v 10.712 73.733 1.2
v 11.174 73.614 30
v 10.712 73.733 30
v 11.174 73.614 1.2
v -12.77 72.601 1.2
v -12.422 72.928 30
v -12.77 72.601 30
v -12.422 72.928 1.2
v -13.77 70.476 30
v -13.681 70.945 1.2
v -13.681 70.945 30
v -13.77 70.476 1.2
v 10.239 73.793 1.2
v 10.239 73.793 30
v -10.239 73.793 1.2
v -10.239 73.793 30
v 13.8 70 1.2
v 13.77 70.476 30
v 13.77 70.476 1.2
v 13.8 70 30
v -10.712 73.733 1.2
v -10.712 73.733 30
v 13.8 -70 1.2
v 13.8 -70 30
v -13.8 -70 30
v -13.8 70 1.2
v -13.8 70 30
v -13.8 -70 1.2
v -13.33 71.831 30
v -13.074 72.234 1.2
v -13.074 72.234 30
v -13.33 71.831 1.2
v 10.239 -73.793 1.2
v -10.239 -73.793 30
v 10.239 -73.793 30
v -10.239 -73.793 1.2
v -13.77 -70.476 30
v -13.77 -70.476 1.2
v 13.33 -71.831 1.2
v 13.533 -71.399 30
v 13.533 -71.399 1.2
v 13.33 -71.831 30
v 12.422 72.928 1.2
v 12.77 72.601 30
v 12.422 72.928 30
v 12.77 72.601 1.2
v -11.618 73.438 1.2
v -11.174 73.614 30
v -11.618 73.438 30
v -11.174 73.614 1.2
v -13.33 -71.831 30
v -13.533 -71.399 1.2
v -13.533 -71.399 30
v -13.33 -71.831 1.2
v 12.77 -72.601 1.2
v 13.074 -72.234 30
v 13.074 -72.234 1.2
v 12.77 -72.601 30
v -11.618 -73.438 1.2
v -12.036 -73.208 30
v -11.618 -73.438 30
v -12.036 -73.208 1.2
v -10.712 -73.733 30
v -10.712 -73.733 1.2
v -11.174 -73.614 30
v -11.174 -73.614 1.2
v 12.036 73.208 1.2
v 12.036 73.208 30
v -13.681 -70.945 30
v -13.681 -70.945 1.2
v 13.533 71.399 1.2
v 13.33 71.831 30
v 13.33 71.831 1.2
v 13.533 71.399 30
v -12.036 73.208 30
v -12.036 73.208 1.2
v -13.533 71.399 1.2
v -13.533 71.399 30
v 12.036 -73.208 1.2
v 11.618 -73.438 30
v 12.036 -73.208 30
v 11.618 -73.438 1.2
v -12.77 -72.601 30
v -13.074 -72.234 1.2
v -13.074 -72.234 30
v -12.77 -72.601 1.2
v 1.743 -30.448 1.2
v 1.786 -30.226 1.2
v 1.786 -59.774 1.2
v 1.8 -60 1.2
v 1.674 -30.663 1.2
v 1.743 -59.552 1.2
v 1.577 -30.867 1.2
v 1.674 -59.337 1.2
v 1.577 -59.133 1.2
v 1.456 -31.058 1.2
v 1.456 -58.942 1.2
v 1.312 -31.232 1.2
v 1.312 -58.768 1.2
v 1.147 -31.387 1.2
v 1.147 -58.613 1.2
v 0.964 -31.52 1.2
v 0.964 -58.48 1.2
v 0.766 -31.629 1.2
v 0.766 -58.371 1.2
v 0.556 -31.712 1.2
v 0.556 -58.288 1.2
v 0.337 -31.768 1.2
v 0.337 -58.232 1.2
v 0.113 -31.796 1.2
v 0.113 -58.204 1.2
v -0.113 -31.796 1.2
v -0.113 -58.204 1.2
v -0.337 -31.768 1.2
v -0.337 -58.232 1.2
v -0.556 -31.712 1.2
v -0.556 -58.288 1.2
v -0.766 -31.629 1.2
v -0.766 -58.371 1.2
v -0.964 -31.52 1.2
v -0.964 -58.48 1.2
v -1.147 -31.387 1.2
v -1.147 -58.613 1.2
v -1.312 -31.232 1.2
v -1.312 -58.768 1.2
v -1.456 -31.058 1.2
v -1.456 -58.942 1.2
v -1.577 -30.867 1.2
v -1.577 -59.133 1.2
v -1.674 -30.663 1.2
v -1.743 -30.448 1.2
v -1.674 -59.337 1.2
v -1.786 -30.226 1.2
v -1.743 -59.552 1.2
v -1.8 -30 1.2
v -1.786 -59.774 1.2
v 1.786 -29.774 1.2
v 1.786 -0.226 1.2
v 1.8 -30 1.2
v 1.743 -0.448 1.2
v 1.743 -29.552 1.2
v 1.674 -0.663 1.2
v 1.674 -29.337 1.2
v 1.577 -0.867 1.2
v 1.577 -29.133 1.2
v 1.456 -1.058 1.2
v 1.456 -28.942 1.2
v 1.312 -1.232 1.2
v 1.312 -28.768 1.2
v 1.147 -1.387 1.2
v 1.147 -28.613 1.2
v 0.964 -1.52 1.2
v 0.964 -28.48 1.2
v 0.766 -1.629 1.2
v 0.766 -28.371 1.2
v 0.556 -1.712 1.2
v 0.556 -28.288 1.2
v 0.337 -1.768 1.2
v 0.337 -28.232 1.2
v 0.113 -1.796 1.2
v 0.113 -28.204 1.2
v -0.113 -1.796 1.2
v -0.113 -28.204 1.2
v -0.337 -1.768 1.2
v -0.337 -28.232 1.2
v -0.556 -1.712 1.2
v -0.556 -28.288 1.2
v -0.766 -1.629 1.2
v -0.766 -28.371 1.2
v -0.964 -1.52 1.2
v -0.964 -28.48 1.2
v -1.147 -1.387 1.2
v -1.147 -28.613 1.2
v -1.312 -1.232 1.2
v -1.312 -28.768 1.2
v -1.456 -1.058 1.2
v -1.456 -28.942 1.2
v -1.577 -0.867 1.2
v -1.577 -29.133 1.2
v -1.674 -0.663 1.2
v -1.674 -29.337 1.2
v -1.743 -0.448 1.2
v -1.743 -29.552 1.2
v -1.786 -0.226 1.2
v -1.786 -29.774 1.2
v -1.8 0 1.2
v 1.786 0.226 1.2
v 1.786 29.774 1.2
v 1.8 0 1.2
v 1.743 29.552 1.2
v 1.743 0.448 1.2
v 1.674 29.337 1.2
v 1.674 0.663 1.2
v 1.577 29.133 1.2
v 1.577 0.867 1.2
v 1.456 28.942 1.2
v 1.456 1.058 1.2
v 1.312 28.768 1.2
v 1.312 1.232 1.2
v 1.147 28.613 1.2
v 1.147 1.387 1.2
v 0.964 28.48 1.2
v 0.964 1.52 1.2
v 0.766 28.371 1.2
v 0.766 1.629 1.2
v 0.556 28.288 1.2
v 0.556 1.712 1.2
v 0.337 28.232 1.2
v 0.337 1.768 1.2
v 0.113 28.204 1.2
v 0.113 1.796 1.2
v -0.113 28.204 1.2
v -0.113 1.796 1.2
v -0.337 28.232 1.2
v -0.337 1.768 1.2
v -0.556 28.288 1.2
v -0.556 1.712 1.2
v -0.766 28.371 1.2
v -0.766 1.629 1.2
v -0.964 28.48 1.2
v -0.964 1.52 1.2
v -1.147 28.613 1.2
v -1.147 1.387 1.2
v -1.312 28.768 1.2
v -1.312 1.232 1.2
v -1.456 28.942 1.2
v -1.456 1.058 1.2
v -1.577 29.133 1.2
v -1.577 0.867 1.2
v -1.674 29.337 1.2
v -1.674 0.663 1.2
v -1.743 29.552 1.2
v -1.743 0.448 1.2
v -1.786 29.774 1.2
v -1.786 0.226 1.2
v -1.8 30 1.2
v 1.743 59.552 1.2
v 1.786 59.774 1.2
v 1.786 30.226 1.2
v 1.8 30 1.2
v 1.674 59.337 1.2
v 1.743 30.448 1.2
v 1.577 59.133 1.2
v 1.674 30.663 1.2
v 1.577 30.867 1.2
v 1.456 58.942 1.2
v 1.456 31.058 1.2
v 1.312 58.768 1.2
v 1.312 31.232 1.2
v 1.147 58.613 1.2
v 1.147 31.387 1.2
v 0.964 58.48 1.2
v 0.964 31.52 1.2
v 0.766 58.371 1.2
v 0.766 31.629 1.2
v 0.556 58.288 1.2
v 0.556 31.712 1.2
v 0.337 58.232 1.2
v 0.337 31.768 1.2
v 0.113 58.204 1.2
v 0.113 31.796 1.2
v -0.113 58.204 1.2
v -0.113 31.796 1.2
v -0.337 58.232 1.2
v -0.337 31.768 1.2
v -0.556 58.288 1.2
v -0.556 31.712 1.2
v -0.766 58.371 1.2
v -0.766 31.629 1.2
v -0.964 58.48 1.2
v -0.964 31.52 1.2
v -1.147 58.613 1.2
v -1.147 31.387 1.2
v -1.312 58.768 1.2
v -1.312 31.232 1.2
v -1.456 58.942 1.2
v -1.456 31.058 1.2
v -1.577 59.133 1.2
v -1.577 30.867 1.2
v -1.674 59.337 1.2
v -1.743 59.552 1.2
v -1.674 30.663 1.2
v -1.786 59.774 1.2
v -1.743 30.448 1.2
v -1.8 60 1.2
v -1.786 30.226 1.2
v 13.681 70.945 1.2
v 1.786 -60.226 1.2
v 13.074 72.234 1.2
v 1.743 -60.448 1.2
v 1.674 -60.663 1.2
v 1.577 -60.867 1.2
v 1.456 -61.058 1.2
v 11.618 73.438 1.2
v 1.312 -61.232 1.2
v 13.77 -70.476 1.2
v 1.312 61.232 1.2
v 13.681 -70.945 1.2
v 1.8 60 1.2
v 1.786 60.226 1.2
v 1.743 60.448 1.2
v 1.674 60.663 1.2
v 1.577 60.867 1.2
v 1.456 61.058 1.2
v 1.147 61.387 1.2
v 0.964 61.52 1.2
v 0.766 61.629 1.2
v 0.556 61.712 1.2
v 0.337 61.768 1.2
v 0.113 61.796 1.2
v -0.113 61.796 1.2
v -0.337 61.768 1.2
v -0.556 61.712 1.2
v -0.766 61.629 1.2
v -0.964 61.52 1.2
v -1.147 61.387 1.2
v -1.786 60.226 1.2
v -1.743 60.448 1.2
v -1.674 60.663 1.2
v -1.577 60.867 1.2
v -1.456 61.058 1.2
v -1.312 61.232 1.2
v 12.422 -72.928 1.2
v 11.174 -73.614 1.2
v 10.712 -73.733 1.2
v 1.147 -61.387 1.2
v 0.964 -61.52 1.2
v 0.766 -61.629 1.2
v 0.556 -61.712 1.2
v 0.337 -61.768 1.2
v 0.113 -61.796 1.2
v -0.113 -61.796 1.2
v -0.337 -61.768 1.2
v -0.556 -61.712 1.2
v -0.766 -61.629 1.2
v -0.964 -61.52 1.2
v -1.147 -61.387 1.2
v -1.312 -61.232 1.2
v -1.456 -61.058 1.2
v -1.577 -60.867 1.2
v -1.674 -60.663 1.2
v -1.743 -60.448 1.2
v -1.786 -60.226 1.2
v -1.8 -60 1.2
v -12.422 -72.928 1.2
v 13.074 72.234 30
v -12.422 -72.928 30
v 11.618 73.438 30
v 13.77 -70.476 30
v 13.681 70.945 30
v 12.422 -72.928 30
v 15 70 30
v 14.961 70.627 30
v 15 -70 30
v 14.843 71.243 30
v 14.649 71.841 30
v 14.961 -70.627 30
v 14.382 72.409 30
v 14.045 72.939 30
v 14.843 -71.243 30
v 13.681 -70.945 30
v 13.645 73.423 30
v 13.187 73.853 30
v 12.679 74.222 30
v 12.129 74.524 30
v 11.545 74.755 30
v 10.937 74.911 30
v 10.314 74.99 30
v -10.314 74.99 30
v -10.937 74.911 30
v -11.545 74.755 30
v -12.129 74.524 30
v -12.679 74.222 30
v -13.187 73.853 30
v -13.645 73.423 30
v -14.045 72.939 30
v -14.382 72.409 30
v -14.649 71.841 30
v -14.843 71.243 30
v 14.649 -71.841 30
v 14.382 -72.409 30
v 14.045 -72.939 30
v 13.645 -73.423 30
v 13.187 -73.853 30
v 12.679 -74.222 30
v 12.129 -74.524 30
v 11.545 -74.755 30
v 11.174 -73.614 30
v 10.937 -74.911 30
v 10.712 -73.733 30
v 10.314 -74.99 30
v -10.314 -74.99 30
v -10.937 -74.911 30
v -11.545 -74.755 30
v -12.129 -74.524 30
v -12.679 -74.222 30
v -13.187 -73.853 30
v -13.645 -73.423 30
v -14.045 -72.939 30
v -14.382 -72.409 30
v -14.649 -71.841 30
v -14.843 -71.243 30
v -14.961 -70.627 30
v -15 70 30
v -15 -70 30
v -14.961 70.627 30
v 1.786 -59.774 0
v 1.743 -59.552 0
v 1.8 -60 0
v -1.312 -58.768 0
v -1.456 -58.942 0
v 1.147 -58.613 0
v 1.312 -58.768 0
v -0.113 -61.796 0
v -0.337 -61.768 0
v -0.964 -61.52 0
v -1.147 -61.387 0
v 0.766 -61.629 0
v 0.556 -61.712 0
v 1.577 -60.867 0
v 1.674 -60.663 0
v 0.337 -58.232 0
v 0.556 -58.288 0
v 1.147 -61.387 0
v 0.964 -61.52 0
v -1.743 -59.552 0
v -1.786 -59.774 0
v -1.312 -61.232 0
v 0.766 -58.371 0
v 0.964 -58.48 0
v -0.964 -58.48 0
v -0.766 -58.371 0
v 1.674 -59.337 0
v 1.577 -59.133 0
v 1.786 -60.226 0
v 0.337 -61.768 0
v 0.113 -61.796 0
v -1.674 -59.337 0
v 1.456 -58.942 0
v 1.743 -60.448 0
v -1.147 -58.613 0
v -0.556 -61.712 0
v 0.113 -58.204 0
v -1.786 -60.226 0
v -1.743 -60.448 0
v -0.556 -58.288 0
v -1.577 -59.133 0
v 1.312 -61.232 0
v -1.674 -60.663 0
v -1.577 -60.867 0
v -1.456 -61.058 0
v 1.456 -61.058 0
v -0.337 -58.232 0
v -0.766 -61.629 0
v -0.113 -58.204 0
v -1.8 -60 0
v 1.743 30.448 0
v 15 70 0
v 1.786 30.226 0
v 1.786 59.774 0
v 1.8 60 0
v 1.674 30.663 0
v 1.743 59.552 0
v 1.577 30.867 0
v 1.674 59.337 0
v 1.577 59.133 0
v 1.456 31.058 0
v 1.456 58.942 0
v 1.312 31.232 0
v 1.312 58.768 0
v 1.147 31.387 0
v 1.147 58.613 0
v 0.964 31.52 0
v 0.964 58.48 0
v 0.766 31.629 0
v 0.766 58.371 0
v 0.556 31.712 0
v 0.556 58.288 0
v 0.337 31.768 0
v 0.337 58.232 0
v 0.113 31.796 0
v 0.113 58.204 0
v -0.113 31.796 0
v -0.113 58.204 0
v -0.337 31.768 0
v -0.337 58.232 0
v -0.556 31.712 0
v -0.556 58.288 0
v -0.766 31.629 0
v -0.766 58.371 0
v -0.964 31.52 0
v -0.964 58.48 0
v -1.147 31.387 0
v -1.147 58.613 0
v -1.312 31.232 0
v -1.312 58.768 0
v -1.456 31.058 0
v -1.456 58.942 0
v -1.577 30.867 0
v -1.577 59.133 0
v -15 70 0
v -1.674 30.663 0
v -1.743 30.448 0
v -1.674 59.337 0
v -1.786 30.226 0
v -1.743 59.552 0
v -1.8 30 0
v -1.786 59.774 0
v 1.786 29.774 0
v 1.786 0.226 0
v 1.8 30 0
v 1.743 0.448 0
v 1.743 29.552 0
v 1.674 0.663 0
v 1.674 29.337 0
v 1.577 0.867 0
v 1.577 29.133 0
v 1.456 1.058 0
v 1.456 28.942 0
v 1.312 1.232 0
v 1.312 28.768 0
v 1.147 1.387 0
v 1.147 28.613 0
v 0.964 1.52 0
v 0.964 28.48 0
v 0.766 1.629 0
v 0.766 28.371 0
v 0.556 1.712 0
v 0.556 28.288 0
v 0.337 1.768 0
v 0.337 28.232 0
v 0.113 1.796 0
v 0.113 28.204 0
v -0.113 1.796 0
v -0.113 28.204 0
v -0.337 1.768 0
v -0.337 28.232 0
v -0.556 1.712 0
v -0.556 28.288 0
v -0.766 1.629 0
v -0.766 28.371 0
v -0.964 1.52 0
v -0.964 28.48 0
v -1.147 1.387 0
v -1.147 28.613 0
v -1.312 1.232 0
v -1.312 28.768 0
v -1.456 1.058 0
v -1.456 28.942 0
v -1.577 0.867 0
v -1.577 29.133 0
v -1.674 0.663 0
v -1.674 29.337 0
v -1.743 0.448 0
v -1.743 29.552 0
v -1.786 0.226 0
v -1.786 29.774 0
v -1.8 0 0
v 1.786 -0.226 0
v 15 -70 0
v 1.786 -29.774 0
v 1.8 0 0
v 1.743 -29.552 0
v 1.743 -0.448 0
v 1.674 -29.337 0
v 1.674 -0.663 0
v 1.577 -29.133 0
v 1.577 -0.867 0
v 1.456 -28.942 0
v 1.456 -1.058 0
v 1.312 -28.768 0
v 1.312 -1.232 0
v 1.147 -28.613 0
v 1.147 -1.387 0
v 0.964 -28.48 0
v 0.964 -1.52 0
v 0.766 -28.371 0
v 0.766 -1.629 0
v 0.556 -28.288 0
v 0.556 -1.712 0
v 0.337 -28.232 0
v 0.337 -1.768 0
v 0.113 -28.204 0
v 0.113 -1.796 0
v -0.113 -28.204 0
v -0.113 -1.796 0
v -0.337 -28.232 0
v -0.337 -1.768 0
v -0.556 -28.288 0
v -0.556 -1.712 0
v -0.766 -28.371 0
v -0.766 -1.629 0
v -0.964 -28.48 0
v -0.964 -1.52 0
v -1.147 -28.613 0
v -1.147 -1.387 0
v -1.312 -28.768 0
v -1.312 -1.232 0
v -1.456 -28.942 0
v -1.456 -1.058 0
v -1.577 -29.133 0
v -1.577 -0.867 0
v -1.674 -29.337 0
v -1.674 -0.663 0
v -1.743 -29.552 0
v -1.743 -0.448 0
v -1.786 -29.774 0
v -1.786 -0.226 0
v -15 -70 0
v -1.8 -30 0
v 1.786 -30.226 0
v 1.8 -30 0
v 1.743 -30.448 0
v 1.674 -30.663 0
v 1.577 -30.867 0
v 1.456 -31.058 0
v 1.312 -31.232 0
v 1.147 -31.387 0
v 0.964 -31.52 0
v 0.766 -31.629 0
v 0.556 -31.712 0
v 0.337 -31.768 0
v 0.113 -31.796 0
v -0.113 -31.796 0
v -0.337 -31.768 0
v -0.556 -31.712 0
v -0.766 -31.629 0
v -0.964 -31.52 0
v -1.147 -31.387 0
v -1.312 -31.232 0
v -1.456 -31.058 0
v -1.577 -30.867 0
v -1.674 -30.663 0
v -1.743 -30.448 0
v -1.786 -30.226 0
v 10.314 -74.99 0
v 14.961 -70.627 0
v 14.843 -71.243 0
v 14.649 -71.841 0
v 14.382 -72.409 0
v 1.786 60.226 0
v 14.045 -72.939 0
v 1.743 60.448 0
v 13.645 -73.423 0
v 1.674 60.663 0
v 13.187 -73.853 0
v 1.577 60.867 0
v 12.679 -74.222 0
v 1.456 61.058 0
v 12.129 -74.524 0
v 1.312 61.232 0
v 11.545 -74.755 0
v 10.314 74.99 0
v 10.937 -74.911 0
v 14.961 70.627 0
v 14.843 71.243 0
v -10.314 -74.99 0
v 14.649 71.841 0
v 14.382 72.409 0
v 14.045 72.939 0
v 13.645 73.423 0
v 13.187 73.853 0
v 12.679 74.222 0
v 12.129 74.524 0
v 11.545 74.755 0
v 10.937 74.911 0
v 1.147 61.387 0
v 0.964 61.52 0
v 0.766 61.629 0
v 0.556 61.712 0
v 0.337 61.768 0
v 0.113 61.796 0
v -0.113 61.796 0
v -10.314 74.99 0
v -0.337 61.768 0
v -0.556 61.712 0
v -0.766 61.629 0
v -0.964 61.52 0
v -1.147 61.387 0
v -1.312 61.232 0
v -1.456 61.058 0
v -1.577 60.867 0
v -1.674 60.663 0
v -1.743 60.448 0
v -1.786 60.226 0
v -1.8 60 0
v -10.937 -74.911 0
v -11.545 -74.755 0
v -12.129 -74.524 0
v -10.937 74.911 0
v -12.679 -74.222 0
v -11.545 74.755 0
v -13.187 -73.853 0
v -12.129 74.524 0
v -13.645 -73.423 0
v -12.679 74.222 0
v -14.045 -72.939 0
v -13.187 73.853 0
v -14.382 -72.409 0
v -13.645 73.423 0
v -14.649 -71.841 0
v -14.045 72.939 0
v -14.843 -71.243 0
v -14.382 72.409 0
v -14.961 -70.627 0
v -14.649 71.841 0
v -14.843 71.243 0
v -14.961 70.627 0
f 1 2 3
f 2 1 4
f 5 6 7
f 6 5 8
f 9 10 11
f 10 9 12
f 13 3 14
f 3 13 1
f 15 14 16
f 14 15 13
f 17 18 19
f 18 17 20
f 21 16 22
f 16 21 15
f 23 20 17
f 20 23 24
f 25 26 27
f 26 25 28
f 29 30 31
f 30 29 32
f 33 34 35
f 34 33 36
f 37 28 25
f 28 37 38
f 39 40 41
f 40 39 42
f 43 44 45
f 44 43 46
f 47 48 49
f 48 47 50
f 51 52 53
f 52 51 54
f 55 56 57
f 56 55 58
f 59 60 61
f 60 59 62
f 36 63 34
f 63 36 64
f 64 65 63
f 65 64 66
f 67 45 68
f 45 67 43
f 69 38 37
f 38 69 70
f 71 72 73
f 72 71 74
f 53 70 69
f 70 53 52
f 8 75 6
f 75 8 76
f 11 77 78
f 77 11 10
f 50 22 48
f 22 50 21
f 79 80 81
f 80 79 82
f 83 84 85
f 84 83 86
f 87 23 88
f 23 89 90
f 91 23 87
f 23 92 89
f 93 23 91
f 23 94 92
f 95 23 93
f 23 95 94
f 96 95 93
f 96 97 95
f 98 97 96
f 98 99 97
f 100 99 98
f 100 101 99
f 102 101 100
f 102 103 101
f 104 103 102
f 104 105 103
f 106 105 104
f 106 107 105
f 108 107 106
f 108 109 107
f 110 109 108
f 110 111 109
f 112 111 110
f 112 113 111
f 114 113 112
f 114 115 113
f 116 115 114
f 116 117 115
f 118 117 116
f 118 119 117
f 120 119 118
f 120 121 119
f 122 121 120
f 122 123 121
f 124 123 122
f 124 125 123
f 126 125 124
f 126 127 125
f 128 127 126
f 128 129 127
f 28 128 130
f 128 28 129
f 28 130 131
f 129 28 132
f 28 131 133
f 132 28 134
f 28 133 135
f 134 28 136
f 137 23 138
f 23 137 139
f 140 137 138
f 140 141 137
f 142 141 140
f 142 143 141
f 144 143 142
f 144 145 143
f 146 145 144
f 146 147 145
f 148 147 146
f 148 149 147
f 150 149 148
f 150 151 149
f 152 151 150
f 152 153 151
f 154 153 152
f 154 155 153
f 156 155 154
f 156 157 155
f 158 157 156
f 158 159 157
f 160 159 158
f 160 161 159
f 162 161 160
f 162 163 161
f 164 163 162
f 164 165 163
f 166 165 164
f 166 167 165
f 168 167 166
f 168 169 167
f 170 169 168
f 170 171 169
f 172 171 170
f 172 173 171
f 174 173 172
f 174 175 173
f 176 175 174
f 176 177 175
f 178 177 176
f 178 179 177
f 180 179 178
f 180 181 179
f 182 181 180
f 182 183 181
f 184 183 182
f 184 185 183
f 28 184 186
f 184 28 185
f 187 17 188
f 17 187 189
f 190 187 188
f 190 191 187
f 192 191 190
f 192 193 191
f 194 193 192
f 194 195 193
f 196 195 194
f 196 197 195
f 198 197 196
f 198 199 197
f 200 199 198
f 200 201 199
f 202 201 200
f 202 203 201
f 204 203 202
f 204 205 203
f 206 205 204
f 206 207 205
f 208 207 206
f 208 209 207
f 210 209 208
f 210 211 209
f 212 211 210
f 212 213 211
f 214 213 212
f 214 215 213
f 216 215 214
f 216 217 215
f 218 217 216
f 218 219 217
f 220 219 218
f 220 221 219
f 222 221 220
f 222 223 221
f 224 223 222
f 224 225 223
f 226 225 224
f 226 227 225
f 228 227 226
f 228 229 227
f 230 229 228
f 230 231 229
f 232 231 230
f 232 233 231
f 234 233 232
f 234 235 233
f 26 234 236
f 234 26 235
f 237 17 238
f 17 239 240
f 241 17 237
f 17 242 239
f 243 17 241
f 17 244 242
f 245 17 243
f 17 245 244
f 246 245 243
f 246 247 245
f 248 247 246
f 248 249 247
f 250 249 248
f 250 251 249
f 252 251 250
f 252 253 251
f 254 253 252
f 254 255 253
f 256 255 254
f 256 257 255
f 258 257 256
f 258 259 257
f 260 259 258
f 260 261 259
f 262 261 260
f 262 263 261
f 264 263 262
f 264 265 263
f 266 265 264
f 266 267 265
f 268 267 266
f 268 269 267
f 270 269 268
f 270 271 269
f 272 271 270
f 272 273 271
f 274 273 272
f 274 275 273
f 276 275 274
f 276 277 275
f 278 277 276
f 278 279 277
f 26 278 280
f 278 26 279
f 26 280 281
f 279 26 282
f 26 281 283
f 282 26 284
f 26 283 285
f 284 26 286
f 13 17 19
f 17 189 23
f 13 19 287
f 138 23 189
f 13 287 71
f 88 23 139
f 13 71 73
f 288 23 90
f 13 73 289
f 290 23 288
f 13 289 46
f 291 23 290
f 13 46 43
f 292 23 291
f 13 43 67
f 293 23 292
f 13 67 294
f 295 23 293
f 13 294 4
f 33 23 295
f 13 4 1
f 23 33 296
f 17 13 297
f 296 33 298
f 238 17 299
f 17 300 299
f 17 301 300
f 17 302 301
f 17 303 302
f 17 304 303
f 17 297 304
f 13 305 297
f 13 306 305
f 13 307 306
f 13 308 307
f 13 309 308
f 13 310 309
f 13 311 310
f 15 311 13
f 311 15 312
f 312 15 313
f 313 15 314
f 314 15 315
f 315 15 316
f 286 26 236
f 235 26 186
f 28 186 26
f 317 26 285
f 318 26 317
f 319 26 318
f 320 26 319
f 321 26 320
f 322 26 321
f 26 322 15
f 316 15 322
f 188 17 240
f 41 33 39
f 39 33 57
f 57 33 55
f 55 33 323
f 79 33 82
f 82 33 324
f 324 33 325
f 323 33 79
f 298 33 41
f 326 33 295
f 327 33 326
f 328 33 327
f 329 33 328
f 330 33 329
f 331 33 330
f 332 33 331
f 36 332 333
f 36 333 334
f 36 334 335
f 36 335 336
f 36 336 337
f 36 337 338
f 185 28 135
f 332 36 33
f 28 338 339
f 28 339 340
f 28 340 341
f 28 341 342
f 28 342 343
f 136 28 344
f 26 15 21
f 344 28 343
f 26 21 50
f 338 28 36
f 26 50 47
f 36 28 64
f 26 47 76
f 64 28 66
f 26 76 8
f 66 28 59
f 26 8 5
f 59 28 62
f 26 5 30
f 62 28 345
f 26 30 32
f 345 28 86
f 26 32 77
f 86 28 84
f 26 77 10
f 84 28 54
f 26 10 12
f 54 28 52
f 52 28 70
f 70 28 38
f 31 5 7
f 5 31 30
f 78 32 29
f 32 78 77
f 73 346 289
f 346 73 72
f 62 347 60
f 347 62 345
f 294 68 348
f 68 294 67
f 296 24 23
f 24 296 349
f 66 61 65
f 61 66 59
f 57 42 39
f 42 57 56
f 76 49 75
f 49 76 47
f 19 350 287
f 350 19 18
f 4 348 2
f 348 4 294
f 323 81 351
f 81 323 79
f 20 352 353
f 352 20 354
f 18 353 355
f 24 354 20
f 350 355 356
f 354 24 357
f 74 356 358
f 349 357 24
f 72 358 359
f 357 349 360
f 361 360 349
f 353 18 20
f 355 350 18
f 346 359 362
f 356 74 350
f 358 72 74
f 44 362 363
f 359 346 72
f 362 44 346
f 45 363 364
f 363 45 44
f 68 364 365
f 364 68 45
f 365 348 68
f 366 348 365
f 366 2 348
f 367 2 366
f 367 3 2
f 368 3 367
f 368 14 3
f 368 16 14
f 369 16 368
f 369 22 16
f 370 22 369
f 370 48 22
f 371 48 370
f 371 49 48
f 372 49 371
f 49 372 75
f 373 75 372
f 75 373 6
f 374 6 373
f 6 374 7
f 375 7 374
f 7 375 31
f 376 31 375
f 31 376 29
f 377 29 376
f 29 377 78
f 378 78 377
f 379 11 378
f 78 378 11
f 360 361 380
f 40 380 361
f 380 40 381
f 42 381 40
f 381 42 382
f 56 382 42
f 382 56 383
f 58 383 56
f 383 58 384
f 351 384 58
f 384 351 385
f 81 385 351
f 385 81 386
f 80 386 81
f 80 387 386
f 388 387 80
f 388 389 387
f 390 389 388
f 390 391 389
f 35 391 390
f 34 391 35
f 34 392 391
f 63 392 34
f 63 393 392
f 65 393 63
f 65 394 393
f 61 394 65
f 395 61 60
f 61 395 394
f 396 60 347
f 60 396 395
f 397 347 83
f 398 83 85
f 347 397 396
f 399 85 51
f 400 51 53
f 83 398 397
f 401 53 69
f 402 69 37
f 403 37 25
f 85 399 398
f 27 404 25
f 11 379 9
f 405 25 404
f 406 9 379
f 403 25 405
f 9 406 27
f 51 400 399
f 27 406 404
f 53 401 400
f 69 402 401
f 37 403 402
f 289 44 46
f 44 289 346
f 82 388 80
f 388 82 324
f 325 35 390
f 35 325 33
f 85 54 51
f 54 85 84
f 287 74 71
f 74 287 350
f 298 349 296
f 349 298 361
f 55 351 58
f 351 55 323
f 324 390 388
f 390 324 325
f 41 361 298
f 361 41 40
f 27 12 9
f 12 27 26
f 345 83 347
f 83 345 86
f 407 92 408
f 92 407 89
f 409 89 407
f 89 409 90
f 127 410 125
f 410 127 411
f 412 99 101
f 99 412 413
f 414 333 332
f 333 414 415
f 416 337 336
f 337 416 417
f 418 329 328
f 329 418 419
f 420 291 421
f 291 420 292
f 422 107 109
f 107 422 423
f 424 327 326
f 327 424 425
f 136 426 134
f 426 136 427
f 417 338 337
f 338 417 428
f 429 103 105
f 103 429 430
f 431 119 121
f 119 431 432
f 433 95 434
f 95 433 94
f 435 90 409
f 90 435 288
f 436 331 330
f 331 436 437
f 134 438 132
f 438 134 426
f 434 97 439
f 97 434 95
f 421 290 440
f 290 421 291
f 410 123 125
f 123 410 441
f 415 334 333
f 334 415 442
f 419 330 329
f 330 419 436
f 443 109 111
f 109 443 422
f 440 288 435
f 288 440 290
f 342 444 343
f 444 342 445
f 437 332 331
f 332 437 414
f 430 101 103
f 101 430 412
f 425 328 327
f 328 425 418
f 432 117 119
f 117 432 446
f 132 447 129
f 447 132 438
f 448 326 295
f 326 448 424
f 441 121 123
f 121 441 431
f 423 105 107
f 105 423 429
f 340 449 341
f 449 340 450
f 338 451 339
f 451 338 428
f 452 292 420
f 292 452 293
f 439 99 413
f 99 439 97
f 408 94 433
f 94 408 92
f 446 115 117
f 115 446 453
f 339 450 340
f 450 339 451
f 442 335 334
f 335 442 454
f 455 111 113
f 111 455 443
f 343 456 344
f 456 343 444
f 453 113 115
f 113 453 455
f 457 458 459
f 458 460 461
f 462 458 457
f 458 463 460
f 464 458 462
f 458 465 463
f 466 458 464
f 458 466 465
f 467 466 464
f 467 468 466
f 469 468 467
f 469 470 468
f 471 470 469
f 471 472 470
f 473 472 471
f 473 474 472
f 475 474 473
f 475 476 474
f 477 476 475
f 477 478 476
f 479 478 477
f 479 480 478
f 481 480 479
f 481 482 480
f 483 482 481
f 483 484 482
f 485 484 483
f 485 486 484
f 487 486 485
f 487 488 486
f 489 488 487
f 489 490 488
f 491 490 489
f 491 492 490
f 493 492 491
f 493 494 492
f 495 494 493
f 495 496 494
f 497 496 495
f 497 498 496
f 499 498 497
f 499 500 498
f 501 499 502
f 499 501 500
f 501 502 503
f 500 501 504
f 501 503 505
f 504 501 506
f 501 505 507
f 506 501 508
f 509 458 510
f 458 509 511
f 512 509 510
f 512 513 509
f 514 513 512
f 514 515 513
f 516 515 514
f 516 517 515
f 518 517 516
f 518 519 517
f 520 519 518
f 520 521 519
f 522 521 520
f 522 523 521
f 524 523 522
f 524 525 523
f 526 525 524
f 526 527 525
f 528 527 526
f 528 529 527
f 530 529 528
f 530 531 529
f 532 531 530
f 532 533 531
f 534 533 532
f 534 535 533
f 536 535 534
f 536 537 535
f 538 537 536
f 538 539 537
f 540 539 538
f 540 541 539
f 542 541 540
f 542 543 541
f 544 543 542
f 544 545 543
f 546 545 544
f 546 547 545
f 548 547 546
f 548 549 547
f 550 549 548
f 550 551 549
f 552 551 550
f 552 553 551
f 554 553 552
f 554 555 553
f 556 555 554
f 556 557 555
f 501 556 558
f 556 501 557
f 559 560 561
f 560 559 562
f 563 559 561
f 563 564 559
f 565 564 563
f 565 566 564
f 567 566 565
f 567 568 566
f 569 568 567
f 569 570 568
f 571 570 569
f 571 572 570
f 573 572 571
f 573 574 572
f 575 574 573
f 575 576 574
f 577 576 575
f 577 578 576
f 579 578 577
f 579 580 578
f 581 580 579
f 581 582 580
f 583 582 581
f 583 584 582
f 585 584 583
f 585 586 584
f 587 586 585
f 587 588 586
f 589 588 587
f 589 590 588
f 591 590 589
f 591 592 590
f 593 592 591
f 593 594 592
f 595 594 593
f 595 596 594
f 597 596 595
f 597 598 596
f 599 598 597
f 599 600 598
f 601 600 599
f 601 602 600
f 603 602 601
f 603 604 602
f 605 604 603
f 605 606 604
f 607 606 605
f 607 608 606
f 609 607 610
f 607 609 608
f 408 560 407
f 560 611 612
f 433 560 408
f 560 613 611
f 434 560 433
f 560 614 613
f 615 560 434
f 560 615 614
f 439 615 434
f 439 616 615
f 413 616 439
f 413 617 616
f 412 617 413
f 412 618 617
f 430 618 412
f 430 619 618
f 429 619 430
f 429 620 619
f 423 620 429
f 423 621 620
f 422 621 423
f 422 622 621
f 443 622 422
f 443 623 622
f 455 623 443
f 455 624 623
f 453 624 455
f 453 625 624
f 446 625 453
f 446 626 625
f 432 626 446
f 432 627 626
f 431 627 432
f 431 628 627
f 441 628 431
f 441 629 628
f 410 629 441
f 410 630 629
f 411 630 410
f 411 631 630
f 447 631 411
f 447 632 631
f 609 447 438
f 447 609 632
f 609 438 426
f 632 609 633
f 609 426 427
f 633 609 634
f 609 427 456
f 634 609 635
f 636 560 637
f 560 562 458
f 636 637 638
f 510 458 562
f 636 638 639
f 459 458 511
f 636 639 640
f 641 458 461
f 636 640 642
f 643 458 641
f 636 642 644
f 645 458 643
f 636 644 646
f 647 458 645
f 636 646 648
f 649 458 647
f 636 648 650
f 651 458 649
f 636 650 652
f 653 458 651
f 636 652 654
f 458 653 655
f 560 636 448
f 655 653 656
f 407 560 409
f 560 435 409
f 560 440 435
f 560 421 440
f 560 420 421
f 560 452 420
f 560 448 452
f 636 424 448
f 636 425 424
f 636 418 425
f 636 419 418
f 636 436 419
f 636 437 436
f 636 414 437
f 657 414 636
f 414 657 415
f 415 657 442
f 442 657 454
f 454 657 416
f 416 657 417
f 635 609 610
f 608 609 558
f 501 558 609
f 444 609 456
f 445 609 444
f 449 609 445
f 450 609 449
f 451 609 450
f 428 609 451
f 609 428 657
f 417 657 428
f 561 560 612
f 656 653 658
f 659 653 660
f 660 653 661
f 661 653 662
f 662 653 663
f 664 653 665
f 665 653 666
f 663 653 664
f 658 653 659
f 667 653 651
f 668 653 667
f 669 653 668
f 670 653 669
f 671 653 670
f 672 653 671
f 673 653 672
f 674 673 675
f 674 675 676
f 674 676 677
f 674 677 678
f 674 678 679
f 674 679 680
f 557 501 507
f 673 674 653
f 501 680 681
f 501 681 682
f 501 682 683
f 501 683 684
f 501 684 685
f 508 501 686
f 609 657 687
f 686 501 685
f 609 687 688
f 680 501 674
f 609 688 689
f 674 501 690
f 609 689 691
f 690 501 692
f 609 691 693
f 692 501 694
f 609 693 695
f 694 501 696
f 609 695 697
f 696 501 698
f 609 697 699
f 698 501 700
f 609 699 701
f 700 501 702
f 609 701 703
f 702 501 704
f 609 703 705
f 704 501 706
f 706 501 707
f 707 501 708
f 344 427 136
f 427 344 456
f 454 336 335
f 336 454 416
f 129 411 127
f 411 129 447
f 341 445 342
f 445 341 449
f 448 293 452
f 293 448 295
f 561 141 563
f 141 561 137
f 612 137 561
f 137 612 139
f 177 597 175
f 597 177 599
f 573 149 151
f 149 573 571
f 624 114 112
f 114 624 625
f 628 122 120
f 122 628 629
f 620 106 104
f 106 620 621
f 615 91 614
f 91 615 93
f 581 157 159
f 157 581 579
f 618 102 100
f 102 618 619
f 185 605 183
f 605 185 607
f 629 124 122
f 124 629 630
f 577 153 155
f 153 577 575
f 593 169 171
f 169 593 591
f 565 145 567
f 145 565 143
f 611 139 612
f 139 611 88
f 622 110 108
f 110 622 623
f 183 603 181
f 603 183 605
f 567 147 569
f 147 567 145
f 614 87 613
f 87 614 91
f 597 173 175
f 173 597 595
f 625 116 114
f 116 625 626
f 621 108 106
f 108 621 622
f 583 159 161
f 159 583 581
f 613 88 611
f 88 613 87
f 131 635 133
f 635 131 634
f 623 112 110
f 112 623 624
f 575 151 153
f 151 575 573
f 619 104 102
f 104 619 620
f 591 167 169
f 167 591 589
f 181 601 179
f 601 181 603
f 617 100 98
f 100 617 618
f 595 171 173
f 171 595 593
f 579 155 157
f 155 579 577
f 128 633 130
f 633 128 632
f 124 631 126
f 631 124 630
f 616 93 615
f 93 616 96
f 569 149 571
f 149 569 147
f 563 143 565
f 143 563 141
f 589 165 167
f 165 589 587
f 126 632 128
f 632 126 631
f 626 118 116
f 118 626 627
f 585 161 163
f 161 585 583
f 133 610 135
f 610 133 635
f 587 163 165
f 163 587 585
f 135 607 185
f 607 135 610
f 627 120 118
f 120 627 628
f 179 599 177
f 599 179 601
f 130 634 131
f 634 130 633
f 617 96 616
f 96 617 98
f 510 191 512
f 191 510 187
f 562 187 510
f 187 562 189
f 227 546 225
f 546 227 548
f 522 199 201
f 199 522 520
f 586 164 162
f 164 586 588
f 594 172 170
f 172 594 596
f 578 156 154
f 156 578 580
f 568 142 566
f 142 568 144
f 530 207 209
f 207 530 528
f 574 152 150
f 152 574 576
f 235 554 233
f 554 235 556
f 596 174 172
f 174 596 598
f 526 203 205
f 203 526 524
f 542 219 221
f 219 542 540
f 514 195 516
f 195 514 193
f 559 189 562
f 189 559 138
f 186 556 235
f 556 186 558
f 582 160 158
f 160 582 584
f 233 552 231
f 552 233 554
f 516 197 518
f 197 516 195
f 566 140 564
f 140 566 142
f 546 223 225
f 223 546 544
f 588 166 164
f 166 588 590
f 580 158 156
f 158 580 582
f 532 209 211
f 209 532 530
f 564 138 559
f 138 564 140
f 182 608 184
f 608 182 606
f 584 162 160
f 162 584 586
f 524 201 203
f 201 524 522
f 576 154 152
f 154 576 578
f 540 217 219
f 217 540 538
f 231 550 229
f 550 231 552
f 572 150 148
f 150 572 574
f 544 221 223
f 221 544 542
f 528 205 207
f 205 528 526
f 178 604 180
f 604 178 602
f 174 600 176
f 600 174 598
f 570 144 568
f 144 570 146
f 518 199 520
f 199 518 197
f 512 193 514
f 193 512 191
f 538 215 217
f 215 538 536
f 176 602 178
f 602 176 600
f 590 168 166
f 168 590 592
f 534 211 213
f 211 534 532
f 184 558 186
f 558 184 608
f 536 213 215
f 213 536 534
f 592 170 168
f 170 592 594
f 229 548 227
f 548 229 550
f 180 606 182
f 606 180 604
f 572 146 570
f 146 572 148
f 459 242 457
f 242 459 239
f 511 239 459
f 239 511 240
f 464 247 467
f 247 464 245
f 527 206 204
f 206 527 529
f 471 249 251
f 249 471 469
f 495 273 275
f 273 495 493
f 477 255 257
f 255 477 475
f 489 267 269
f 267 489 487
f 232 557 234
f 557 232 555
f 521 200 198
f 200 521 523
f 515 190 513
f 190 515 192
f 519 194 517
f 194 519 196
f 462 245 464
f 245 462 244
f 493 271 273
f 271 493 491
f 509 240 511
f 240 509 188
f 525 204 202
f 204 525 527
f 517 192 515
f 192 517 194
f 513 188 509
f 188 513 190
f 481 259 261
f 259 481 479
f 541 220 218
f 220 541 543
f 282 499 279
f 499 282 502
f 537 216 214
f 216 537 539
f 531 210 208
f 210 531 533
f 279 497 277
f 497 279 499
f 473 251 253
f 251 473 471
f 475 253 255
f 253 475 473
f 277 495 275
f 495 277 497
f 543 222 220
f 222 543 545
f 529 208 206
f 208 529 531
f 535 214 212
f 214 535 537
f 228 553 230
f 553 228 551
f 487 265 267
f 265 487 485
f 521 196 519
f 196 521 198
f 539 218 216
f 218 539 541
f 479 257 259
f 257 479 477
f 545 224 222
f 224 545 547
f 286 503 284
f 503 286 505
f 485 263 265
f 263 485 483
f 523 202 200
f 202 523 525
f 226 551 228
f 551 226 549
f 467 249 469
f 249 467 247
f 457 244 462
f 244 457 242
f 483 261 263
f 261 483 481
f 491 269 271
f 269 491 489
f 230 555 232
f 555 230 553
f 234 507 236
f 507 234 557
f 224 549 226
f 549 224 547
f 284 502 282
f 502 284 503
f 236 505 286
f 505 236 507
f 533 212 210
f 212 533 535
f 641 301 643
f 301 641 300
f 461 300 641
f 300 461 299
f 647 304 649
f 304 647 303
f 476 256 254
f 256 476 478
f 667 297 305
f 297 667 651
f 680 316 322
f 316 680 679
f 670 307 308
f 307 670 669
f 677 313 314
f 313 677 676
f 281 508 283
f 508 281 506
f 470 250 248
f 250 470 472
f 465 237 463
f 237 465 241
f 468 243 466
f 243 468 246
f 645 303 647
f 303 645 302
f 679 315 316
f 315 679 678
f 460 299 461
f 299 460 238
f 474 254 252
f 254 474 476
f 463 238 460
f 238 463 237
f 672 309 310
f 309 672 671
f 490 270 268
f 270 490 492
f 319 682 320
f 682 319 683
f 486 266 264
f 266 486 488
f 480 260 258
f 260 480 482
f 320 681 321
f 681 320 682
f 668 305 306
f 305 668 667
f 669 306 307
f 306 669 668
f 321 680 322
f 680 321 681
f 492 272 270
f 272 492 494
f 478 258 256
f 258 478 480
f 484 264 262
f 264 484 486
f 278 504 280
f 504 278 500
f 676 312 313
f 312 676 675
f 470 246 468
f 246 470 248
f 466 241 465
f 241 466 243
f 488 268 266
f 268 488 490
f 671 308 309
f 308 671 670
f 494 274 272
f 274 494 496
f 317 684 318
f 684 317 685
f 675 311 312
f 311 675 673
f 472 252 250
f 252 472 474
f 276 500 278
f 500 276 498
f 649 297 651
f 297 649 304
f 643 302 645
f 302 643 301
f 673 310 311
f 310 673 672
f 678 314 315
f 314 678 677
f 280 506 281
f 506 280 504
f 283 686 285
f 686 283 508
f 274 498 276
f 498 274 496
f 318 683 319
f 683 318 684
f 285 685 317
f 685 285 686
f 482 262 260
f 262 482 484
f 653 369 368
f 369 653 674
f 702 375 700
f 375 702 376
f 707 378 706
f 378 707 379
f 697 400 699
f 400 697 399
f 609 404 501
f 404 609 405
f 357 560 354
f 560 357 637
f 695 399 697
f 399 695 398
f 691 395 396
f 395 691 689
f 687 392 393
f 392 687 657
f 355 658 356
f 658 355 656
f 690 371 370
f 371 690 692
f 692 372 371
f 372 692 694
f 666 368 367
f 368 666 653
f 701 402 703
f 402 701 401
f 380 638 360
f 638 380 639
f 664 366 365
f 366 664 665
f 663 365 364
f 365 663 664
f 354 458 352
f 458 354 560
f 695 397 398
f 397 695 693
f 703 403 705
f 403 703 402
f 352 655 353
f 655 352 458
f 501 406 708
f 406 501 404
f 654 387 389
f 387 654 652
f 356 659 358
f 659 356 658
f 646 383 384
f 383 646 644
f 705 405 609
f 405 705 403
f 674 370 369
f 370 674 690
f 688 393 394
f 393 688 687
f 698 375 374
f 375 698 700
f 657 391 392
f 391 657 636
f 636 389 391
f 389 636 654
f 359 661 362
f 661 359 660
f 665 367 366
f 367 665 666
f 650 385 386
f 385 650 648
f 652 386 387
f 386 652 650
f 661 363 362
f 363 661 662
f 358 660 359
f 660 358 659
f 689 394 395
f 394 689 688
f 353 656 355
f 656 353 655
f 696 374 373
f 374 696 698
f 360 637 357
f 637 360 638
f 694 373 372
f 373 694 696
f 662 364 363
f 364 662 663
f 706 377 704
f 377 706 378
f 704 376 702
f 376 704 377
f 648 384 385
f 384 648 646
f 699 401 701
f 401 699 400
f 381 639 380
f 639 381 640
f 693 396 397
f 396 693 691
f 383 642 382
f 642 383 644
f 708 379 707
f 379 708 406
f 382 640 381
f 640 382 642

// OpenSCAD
$fn = 50;


difference() {
	union() {
		hull() {
			translate(v = [-10.0000000000, 70.0000000000, 0]) {
				cylinder(h = 30, r = 5);
			}
			translate(v = [10.0000000000, 70.0000000000, 0]) {
				cylinder(h = 30, r = 5);
			}
			translate(v = [-10.0000000000, -70.0000000000, 0]) {
				cylinder(h = 30, r = 5);
			}
			translate(v = [10.0000000000, -70.0000000000, 0]) {
				cylinder(h = 30, r = 5);
			}
		}
	}
	union() {
		translate(v = [0, 0, 1.2000000000]) {
			hull() {
				translate(v = [-10.0000000000, 70.0000000000, 0]) {
					cylinder(h = 28.8000000000, r = 3.8000000000);
				}
				translate(v = [10.0000000000, 70.0000000000, 0]) {
					cylinder(h = 28.8000000000, r = 3.8000000000);
				}
				translate(v = [-10.0000000000, -70.0000000000, 0]) {
					cylinder(h = 28.8000000000, r = 3.8000000000);
				}
				translate(v = [10.0000000000, -70.0000000000, 0]) {
					cylinder(h = 28.8000000000, r = 3.8000000000);
				}
			}
		}
		#translate(v = [0.0000000000, -60.0000000000, 0]) {
			cylinder(h = 1.2000000000, r = 1.8000000000);
		}
		#translate(v = [0.0000000000, -30.0000000000, 0]) {
			cylinder(h = 1.2000000000, r = 1.8000000000);
		}
		#cylinder(h = 1.2000000000, r = 1.8000000000);
		#translate(v = [0.0000000000, 30.0000000000, 0]) {
			cylinder(h = 1.2000000000, r = 1.8000000000);
		}
		#translate(v = [0.0000000000, 60.0000000000, 0]) {
			cylinder(h = 1.2000000000, r = 1.8000000000);
		}
	}
}
